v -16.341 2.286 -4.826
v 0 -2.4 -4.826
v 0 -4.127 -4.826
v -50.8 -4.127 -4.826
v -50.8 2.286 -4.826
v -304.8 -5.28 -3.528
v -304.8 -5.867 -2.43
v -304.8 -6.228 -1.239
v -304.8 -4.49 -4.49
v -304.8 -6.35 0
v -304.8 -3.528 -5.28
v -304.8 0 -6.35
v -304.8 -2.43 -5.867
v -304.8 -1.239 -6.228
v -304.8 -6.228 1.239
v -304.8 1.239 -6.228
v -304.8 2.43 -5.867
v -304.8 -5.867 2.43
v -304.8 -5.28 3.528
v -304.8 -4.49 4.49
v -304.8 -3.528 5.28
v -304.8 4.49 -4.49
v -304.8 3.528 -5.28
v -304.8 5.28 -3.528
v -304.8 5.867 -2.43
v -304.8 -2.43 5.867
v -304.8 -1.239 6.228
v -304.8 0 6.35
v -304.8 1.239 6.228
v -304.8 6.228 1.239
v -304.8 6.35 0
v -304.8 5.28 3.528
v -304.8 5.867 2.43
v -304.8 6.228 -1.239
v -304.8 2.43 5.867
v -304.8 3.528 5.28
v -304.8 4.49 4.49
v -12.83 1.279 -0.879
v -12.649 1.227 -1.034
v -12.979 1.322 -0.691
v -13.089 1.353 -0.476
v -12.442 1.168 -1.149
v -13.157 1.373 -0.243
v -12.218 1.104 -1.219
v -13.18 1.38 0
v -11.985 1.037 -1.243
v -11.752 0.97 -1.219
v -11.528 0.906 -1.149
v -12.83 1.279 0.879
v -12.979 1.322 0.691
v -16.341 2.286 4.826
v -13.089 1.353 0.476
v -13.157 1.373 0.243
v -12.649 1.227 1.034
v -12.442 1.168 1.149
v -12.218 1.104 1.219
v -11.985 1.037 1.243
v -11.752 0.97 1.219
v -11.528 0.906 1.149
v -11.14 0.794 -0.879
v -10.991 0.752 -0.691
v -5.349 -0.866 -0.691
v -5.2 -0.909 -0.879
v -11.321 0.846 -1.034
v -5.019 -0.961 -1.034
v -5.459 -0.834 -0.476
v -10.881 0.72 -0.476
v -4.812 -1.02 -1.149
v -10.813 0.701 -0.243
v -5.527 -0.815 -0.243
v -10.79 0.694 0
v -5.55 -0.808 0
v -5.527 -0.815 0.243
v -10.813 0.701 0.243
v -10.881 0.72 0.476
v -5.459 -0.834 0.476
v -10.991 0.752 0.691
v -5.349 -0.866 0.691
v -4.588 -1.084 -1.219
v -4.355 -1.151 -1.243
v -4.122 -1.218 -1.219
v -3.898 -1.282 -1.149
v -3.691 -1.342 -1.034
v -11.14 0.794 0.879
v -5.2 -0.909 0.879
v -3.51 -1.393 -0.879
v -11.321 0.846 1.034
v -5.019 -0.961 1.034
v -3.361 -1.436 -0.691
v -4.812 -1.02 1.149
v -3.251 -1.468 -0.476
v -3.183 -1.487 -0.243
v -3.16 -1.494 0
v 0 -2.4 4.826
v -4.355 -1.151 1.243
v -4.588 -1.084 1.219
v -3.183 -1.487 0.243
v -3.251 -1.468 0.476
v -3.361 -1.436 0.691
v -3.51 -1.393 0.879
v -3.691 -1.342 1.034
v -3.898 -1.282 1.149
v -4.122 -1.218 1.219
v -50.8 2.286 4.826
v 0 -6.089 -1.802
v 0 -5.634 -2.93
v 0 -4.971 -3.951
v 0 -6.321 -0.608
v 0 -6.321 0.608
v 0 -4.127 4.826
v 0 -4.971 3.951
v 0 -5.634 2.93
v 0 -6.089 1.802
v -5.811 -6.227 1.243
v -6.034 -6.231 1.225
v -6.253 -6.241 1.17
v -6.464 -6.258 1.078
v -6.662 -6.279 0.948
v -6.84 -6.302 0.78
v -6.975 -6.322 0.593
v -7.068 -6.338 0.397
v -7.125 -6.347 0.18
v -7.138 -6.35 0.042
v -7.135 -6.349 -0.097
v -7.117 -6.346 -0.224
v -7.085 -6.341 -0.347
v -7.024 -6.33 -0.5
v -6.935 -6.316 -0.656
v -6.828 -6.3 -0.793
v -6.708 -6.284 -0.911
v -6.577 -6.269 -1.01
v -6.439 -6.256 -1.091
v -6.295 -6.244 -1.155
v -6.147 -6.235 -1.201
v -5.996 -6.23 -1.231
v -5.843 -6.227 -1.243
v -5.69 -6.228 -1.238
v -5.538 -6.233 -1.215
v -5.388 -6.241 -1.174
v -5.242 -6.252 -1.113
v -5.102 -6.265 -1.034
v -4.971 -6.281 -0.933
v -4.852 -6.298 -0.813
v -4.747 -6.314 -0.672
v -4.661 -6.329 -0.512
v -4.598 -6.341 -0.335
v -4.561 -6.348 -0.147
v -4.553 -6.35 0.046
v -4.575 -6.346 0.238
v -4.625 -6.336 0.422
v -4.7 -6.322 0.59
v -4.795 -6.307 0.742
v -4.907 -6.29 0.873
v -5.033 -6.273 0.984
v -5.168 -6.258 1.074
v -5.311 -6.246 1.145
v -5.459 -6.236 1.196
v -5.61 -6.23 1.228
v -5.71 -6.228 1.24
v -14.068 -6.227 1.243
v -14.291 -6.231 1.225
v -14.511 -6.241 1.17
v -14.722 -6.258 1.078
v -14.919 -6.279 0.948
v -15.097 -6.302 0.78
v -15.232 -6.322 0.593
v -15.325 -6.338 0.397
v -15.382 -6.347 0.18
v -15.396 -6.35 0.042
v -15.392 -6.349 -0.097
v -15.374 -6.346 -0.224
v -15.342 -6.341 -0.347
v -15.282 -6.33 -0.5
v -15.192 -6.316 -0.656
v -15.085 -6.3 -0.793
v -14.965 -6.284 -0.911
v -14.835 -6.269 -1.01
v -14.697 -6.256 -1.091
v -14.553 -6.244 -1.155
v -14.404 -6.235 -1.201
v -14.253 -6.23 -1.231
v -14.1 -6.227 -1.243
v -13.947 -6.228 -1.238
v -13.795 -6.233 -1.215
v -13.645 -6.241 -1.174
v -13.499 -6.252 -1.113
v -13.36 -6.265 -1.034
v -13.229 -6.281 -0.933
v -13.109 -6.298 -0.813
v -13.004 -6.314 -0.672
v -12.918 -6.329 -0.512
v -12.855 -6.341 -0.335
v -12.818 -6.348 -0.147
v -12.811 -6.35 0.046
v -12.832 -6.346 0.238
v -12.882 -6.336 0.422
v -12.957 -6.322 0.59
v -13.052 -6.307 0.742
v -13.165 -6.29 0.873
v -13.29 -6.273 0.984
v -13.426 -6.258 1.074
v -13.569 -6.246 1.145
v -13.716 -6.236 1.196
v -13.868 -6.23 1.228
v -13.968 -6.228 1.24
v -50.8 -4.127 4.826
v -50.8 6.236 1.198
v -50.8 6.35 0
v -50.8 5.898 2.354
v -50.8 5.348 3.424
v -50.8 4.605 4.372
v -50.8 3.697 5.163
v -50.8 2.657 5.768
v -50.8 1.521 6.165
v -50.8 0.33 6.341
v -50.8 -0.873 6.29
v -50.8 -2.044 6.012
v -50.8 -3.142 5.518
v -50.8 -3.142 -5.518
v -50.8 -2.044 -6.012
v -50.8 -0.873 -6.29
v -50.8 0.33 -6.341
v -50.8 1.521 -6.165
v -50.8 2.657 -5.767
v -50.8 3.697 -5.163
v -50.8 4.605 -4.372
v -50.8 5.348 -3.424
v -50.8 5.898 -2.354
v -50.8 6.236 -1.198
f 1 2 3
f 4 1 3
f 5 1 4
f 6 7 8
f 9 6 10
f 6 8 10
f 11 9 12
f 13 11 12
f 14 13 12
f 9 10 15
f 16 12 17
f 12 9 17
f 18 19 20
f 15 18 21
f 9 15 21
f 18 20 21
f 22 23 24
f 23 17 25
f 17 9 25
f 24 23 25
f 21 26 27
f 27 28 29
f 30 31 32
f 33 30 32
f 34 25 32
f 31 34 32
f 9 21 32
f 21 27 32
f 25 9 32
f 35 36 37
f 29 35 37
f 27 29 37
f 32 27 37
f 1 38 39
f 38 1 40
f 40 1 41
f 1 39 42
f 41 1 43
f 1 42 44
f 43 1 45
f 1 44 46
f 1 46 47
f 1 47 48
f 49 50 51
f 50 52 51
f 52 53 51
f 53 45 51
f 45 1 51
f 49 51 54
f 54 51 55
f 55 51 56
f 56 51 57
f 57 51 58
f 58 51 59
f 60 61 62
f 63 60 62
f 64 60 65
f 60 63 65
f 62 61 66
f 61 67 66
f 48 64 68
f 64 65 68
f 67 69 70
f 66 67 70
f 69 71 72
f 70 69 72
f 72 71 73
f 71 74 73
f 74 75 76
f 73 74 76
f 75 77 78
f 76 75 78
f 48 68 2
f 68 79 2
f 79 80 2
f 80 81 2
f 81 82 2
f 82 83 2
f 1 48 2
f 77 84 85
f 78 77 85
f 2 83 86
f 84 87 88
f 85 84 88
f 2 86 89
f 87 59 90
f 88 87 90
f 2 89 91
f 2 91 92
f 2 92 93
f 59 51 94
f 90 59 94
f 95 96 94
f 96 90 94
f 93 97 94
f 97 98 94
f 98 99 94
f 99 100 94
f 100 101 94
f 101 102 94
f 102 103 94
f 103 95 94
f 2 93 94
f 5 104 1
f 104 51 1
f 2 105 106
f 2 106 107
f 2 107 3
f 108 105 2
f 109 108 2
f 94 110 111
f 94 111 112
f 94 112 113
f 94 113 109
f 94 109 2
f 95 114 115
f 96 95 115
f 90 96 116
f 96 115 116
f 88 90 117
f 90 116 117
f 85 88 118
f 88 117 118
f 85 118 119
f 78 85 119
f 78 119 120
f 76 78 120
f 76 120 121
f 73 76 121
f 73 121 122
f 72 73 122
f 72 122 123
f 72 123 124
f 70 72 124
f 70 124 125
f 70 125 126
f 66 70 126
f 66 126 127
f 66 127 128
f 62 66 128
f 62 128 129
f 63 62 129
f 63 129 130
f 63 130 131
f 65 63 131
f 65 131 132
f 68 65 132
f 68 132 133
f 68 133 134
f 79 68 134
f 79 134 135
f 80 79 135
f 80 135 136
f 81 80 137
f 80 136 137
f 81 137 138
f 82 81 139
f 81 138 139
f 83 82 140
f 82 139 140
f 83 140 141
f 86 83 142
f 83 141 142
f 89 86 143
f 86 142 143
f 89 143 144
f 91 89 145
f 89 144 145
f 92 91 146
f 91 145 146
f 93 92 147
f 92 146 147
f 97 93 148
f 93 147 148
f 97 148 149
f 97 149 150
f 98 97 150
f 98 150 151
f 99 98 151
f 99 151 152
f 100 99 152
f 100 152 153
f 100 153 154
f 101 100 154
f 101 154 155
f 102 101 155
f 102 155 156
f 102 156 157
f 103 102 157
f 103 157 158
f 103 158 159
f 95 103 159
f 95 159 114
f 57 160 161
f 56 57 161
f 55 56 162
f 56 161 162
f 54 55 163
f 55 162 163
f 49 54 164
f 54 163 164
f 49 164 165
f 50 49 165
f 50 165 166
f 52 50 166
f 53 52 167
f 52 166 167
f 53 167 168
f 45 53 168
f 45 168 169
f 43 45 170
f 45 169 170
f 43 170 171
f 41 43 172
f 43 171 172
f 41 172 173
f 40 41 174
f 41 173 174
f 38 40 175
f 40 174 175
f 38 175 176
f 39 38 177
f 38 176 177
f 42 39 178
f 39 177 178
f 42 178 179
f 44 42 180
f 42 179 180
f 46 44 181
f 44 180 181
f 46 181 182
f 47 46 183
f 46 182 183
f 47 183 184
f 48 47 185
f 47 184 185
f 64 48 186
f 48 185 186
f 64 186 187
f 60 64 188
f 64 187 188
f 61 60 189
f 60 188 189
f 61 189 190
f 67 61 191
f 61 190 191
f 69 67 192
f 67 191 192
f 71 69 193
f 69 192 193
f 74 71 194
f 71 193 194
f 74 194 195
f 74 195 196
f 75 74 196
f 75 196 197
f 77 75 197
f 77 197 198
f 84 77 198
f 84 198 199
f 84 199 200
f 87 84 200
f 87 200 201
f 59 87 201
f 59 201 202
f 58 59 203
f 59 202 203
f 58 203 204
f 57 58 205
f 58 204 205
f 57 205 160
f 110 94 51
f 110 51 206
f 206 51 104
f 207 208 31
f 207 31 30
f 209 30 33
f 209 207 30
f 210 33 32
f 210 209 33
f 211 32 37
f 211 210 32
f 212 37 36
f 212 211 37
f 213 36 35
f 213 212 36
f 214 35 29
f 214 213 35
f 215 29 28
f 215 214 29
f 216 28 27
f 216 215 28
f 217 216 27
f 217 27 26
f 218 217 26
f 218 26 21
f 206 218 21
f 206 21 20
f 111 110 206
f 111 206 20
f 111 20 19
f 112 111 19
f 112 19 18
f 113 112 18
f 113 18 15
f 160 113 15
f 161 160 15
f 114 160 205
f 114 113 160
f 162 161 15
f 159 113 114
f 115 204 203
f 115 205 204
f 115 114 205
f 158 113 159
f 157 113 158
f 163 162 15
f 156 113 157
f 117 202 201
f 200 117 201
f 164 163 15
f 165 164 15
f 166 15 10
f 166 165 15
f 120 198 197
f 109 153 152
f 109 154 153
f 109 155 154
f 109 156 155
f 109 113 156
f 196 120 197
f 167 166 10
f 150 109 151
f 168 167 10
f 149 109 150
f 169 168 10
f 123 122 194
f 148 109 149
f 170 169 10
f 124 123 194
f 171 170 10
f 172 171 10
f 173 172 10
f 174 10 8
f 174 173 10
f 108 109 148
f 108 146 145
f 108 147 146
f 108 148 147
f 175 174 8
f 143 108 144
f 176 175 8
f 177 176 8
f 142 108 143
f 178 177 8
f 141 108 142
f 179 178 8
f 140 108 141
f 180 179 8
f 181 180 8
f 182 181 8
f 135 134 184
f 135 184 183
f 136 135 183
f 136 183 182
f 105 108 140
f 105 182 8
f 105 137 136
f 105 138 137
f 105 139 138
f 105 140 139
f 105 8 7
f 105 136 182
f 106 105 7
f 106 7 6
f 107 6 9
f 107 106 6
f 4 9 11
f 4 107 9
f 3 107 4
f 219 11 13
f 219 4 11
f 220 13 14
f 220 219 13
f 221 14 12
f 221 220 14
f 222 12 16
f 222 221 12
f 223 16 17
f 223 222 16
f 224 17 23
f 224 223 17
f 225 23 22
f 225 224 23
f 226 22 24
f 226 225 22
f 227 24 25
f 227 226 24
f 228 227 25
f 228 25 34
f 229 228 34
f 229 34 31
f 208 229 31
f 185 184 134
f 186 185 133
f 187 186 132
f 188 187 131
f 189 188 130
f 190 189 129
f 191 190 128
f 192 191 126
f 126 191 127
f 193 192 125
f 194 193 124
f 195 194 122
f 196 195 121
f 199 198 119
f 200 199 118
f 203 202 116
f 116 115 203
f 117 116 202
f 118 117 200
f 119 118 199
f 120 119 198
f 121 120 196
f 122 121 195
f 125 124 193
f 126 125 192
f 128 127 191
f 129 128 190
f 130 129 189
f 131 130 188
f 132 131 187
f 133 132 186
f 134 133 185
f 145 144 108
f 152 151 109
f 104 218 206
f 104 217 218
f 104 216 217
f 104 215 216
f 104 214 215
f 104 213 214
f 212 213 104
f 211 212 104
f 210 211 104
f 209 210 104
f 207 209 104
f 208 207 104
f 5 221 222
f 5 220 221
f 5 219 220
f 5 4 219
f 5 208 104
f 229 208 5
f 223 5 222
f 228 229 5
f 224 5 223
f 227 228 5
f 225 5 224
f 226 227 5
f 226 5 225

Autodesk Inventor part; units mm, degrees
ref_plane "YZ Plane" through (0, 0, 0) normal (1, 0, 0) x (0, 1, 0)
ref_plane "XZ Plane" through (0, 0, 0) normal (0, 1, 0) x (-1, 0, 0)
ref_plane "XY Plane" through (0, 0, 0) normal (0, 0, 1) x (1, 0, 0)
sketch "Sketch1" plane through (0, 0, 0) normal (1, 0, 0) x (0, 1, 0)
  circle A0 centre (0, 0) radius 6.35
  dimension "d159" = 12.7
extrude "Extrusion1" add sketch "Sketch1" against normal blind 304.8
sketch "Sketch2" plane through (0, 0, 0) normal (1, 0, 0) x (0, 0, -1)
  arc A0 (5.9242, 2.286) -> (-5.9242, 2.286) centre (0, 0) ccw
  circle A1 centre (0, 0) radius 6.35 projected
  line L0 (-5.9242, 2.286) -> (5.9242, 2.286)
  dimension "d111" = 4.064
extrude "Extrusion2" cut sketch "Sketch2" against normal blind 50.8 contours L0 A0
sketch "Sketch5" plane through (0, 2.286, 5.9242) normal (0, 1, 0) x (1, 0, 0)
  line L0 (0, 5.9242) -> (0, 10.7502)
  line L1 (0, 11.8485) -> (0, 0) projected
  line L2 (0, 10.7502) -> (-50.8, 10.7502)
  line L3 (-50.8, 11.8485) -> (-50.8, 0) projected
  line L4 (0, 5.9242) -> (0, 1.0982)
  line L5 (0, 1.0982) -> (-50.8, 1.0982)
  line L6 (-50.8, 1.0982) -> (-50.8, -4.826)
  line L7 (-50.8, -4.826) -> (10.2611, -4.826)
  line L8 (10.2611, -4.826) -> (0, 1.0982)
  line L9 (-50.8, 10.7502) -> (-50.8, 16.6745)
  line L10 (-50.8, 16.6745) -> (10.2611, 16.6745)
  line L11 (0, 10.7502) -> (10.2611, 16.6745)
  line L12 (-50.8, 11.8485) -> (0, 11.8485) projected
  dimension "d20" = 4.826
  dimension "d21" = 4.826
  dimension "d160" = 4.826
extrude "Extrusion3" cut sketch "Sketch5" against normal blind 25.4 contours L2 L3 L12 L1 | L1 L12 L9 L10 L11 | L8 L7 L6 L3 L5
sketch "Sketch18" plane through (-50.8, 2.286, 4.826) normal (0, 0, 1) x (1, 0, 0)
  line L0 (34.4586, 0) -> (50.8, -4.6858)
  line L1 (0, 0) -> (50.8, 0) projected
  line L2 (34.4586, 0) -> (50.8, 0)
  line L3 (50.8, 0) -> (50.8, -4.6858)
  dimension "d144" = 17
  dimension "d161" = 74
extrude "Extrusion9" cut sketch "Sketch18" against normal blind 25.4
sketch "Sketch19" plane through (-16.3414, 2.286, 4.826) normal (0.2756374, 0.9612617, 0) x (0.9612617, -0.2756374, 0)
  circle A0 centre (12.4695, 4.826) radius 1.5875
  circle A1 centre (4.532, 4.826) radius 1.5875
  line L0 (14.057, 4.826) -> (17, 4.826)
  line L1 (17, 9.652) -> (17, 0) projected
  line L2 (14.057, 4.826) -> (4.532, 4.826) construction
  dimension "d148" = 3.175
  dimension "d149" = 3.175
  dimension "d151" = 7.9375
  dimension "d162" = 2.943
hole "Hole9" at (-11.985, 1.0368, 0) at (-4.355, -1.1511, 0) direction (-0.2756374, -0.9612617, 0) diameter 2.4867 end through all thread size "5-40 UNC" class "2B" standard "ANSI Unified Screw Threads"
equation "\"d160\" = d20"
properties part number "rat_headbarAngled" material "Stainless Steel"
